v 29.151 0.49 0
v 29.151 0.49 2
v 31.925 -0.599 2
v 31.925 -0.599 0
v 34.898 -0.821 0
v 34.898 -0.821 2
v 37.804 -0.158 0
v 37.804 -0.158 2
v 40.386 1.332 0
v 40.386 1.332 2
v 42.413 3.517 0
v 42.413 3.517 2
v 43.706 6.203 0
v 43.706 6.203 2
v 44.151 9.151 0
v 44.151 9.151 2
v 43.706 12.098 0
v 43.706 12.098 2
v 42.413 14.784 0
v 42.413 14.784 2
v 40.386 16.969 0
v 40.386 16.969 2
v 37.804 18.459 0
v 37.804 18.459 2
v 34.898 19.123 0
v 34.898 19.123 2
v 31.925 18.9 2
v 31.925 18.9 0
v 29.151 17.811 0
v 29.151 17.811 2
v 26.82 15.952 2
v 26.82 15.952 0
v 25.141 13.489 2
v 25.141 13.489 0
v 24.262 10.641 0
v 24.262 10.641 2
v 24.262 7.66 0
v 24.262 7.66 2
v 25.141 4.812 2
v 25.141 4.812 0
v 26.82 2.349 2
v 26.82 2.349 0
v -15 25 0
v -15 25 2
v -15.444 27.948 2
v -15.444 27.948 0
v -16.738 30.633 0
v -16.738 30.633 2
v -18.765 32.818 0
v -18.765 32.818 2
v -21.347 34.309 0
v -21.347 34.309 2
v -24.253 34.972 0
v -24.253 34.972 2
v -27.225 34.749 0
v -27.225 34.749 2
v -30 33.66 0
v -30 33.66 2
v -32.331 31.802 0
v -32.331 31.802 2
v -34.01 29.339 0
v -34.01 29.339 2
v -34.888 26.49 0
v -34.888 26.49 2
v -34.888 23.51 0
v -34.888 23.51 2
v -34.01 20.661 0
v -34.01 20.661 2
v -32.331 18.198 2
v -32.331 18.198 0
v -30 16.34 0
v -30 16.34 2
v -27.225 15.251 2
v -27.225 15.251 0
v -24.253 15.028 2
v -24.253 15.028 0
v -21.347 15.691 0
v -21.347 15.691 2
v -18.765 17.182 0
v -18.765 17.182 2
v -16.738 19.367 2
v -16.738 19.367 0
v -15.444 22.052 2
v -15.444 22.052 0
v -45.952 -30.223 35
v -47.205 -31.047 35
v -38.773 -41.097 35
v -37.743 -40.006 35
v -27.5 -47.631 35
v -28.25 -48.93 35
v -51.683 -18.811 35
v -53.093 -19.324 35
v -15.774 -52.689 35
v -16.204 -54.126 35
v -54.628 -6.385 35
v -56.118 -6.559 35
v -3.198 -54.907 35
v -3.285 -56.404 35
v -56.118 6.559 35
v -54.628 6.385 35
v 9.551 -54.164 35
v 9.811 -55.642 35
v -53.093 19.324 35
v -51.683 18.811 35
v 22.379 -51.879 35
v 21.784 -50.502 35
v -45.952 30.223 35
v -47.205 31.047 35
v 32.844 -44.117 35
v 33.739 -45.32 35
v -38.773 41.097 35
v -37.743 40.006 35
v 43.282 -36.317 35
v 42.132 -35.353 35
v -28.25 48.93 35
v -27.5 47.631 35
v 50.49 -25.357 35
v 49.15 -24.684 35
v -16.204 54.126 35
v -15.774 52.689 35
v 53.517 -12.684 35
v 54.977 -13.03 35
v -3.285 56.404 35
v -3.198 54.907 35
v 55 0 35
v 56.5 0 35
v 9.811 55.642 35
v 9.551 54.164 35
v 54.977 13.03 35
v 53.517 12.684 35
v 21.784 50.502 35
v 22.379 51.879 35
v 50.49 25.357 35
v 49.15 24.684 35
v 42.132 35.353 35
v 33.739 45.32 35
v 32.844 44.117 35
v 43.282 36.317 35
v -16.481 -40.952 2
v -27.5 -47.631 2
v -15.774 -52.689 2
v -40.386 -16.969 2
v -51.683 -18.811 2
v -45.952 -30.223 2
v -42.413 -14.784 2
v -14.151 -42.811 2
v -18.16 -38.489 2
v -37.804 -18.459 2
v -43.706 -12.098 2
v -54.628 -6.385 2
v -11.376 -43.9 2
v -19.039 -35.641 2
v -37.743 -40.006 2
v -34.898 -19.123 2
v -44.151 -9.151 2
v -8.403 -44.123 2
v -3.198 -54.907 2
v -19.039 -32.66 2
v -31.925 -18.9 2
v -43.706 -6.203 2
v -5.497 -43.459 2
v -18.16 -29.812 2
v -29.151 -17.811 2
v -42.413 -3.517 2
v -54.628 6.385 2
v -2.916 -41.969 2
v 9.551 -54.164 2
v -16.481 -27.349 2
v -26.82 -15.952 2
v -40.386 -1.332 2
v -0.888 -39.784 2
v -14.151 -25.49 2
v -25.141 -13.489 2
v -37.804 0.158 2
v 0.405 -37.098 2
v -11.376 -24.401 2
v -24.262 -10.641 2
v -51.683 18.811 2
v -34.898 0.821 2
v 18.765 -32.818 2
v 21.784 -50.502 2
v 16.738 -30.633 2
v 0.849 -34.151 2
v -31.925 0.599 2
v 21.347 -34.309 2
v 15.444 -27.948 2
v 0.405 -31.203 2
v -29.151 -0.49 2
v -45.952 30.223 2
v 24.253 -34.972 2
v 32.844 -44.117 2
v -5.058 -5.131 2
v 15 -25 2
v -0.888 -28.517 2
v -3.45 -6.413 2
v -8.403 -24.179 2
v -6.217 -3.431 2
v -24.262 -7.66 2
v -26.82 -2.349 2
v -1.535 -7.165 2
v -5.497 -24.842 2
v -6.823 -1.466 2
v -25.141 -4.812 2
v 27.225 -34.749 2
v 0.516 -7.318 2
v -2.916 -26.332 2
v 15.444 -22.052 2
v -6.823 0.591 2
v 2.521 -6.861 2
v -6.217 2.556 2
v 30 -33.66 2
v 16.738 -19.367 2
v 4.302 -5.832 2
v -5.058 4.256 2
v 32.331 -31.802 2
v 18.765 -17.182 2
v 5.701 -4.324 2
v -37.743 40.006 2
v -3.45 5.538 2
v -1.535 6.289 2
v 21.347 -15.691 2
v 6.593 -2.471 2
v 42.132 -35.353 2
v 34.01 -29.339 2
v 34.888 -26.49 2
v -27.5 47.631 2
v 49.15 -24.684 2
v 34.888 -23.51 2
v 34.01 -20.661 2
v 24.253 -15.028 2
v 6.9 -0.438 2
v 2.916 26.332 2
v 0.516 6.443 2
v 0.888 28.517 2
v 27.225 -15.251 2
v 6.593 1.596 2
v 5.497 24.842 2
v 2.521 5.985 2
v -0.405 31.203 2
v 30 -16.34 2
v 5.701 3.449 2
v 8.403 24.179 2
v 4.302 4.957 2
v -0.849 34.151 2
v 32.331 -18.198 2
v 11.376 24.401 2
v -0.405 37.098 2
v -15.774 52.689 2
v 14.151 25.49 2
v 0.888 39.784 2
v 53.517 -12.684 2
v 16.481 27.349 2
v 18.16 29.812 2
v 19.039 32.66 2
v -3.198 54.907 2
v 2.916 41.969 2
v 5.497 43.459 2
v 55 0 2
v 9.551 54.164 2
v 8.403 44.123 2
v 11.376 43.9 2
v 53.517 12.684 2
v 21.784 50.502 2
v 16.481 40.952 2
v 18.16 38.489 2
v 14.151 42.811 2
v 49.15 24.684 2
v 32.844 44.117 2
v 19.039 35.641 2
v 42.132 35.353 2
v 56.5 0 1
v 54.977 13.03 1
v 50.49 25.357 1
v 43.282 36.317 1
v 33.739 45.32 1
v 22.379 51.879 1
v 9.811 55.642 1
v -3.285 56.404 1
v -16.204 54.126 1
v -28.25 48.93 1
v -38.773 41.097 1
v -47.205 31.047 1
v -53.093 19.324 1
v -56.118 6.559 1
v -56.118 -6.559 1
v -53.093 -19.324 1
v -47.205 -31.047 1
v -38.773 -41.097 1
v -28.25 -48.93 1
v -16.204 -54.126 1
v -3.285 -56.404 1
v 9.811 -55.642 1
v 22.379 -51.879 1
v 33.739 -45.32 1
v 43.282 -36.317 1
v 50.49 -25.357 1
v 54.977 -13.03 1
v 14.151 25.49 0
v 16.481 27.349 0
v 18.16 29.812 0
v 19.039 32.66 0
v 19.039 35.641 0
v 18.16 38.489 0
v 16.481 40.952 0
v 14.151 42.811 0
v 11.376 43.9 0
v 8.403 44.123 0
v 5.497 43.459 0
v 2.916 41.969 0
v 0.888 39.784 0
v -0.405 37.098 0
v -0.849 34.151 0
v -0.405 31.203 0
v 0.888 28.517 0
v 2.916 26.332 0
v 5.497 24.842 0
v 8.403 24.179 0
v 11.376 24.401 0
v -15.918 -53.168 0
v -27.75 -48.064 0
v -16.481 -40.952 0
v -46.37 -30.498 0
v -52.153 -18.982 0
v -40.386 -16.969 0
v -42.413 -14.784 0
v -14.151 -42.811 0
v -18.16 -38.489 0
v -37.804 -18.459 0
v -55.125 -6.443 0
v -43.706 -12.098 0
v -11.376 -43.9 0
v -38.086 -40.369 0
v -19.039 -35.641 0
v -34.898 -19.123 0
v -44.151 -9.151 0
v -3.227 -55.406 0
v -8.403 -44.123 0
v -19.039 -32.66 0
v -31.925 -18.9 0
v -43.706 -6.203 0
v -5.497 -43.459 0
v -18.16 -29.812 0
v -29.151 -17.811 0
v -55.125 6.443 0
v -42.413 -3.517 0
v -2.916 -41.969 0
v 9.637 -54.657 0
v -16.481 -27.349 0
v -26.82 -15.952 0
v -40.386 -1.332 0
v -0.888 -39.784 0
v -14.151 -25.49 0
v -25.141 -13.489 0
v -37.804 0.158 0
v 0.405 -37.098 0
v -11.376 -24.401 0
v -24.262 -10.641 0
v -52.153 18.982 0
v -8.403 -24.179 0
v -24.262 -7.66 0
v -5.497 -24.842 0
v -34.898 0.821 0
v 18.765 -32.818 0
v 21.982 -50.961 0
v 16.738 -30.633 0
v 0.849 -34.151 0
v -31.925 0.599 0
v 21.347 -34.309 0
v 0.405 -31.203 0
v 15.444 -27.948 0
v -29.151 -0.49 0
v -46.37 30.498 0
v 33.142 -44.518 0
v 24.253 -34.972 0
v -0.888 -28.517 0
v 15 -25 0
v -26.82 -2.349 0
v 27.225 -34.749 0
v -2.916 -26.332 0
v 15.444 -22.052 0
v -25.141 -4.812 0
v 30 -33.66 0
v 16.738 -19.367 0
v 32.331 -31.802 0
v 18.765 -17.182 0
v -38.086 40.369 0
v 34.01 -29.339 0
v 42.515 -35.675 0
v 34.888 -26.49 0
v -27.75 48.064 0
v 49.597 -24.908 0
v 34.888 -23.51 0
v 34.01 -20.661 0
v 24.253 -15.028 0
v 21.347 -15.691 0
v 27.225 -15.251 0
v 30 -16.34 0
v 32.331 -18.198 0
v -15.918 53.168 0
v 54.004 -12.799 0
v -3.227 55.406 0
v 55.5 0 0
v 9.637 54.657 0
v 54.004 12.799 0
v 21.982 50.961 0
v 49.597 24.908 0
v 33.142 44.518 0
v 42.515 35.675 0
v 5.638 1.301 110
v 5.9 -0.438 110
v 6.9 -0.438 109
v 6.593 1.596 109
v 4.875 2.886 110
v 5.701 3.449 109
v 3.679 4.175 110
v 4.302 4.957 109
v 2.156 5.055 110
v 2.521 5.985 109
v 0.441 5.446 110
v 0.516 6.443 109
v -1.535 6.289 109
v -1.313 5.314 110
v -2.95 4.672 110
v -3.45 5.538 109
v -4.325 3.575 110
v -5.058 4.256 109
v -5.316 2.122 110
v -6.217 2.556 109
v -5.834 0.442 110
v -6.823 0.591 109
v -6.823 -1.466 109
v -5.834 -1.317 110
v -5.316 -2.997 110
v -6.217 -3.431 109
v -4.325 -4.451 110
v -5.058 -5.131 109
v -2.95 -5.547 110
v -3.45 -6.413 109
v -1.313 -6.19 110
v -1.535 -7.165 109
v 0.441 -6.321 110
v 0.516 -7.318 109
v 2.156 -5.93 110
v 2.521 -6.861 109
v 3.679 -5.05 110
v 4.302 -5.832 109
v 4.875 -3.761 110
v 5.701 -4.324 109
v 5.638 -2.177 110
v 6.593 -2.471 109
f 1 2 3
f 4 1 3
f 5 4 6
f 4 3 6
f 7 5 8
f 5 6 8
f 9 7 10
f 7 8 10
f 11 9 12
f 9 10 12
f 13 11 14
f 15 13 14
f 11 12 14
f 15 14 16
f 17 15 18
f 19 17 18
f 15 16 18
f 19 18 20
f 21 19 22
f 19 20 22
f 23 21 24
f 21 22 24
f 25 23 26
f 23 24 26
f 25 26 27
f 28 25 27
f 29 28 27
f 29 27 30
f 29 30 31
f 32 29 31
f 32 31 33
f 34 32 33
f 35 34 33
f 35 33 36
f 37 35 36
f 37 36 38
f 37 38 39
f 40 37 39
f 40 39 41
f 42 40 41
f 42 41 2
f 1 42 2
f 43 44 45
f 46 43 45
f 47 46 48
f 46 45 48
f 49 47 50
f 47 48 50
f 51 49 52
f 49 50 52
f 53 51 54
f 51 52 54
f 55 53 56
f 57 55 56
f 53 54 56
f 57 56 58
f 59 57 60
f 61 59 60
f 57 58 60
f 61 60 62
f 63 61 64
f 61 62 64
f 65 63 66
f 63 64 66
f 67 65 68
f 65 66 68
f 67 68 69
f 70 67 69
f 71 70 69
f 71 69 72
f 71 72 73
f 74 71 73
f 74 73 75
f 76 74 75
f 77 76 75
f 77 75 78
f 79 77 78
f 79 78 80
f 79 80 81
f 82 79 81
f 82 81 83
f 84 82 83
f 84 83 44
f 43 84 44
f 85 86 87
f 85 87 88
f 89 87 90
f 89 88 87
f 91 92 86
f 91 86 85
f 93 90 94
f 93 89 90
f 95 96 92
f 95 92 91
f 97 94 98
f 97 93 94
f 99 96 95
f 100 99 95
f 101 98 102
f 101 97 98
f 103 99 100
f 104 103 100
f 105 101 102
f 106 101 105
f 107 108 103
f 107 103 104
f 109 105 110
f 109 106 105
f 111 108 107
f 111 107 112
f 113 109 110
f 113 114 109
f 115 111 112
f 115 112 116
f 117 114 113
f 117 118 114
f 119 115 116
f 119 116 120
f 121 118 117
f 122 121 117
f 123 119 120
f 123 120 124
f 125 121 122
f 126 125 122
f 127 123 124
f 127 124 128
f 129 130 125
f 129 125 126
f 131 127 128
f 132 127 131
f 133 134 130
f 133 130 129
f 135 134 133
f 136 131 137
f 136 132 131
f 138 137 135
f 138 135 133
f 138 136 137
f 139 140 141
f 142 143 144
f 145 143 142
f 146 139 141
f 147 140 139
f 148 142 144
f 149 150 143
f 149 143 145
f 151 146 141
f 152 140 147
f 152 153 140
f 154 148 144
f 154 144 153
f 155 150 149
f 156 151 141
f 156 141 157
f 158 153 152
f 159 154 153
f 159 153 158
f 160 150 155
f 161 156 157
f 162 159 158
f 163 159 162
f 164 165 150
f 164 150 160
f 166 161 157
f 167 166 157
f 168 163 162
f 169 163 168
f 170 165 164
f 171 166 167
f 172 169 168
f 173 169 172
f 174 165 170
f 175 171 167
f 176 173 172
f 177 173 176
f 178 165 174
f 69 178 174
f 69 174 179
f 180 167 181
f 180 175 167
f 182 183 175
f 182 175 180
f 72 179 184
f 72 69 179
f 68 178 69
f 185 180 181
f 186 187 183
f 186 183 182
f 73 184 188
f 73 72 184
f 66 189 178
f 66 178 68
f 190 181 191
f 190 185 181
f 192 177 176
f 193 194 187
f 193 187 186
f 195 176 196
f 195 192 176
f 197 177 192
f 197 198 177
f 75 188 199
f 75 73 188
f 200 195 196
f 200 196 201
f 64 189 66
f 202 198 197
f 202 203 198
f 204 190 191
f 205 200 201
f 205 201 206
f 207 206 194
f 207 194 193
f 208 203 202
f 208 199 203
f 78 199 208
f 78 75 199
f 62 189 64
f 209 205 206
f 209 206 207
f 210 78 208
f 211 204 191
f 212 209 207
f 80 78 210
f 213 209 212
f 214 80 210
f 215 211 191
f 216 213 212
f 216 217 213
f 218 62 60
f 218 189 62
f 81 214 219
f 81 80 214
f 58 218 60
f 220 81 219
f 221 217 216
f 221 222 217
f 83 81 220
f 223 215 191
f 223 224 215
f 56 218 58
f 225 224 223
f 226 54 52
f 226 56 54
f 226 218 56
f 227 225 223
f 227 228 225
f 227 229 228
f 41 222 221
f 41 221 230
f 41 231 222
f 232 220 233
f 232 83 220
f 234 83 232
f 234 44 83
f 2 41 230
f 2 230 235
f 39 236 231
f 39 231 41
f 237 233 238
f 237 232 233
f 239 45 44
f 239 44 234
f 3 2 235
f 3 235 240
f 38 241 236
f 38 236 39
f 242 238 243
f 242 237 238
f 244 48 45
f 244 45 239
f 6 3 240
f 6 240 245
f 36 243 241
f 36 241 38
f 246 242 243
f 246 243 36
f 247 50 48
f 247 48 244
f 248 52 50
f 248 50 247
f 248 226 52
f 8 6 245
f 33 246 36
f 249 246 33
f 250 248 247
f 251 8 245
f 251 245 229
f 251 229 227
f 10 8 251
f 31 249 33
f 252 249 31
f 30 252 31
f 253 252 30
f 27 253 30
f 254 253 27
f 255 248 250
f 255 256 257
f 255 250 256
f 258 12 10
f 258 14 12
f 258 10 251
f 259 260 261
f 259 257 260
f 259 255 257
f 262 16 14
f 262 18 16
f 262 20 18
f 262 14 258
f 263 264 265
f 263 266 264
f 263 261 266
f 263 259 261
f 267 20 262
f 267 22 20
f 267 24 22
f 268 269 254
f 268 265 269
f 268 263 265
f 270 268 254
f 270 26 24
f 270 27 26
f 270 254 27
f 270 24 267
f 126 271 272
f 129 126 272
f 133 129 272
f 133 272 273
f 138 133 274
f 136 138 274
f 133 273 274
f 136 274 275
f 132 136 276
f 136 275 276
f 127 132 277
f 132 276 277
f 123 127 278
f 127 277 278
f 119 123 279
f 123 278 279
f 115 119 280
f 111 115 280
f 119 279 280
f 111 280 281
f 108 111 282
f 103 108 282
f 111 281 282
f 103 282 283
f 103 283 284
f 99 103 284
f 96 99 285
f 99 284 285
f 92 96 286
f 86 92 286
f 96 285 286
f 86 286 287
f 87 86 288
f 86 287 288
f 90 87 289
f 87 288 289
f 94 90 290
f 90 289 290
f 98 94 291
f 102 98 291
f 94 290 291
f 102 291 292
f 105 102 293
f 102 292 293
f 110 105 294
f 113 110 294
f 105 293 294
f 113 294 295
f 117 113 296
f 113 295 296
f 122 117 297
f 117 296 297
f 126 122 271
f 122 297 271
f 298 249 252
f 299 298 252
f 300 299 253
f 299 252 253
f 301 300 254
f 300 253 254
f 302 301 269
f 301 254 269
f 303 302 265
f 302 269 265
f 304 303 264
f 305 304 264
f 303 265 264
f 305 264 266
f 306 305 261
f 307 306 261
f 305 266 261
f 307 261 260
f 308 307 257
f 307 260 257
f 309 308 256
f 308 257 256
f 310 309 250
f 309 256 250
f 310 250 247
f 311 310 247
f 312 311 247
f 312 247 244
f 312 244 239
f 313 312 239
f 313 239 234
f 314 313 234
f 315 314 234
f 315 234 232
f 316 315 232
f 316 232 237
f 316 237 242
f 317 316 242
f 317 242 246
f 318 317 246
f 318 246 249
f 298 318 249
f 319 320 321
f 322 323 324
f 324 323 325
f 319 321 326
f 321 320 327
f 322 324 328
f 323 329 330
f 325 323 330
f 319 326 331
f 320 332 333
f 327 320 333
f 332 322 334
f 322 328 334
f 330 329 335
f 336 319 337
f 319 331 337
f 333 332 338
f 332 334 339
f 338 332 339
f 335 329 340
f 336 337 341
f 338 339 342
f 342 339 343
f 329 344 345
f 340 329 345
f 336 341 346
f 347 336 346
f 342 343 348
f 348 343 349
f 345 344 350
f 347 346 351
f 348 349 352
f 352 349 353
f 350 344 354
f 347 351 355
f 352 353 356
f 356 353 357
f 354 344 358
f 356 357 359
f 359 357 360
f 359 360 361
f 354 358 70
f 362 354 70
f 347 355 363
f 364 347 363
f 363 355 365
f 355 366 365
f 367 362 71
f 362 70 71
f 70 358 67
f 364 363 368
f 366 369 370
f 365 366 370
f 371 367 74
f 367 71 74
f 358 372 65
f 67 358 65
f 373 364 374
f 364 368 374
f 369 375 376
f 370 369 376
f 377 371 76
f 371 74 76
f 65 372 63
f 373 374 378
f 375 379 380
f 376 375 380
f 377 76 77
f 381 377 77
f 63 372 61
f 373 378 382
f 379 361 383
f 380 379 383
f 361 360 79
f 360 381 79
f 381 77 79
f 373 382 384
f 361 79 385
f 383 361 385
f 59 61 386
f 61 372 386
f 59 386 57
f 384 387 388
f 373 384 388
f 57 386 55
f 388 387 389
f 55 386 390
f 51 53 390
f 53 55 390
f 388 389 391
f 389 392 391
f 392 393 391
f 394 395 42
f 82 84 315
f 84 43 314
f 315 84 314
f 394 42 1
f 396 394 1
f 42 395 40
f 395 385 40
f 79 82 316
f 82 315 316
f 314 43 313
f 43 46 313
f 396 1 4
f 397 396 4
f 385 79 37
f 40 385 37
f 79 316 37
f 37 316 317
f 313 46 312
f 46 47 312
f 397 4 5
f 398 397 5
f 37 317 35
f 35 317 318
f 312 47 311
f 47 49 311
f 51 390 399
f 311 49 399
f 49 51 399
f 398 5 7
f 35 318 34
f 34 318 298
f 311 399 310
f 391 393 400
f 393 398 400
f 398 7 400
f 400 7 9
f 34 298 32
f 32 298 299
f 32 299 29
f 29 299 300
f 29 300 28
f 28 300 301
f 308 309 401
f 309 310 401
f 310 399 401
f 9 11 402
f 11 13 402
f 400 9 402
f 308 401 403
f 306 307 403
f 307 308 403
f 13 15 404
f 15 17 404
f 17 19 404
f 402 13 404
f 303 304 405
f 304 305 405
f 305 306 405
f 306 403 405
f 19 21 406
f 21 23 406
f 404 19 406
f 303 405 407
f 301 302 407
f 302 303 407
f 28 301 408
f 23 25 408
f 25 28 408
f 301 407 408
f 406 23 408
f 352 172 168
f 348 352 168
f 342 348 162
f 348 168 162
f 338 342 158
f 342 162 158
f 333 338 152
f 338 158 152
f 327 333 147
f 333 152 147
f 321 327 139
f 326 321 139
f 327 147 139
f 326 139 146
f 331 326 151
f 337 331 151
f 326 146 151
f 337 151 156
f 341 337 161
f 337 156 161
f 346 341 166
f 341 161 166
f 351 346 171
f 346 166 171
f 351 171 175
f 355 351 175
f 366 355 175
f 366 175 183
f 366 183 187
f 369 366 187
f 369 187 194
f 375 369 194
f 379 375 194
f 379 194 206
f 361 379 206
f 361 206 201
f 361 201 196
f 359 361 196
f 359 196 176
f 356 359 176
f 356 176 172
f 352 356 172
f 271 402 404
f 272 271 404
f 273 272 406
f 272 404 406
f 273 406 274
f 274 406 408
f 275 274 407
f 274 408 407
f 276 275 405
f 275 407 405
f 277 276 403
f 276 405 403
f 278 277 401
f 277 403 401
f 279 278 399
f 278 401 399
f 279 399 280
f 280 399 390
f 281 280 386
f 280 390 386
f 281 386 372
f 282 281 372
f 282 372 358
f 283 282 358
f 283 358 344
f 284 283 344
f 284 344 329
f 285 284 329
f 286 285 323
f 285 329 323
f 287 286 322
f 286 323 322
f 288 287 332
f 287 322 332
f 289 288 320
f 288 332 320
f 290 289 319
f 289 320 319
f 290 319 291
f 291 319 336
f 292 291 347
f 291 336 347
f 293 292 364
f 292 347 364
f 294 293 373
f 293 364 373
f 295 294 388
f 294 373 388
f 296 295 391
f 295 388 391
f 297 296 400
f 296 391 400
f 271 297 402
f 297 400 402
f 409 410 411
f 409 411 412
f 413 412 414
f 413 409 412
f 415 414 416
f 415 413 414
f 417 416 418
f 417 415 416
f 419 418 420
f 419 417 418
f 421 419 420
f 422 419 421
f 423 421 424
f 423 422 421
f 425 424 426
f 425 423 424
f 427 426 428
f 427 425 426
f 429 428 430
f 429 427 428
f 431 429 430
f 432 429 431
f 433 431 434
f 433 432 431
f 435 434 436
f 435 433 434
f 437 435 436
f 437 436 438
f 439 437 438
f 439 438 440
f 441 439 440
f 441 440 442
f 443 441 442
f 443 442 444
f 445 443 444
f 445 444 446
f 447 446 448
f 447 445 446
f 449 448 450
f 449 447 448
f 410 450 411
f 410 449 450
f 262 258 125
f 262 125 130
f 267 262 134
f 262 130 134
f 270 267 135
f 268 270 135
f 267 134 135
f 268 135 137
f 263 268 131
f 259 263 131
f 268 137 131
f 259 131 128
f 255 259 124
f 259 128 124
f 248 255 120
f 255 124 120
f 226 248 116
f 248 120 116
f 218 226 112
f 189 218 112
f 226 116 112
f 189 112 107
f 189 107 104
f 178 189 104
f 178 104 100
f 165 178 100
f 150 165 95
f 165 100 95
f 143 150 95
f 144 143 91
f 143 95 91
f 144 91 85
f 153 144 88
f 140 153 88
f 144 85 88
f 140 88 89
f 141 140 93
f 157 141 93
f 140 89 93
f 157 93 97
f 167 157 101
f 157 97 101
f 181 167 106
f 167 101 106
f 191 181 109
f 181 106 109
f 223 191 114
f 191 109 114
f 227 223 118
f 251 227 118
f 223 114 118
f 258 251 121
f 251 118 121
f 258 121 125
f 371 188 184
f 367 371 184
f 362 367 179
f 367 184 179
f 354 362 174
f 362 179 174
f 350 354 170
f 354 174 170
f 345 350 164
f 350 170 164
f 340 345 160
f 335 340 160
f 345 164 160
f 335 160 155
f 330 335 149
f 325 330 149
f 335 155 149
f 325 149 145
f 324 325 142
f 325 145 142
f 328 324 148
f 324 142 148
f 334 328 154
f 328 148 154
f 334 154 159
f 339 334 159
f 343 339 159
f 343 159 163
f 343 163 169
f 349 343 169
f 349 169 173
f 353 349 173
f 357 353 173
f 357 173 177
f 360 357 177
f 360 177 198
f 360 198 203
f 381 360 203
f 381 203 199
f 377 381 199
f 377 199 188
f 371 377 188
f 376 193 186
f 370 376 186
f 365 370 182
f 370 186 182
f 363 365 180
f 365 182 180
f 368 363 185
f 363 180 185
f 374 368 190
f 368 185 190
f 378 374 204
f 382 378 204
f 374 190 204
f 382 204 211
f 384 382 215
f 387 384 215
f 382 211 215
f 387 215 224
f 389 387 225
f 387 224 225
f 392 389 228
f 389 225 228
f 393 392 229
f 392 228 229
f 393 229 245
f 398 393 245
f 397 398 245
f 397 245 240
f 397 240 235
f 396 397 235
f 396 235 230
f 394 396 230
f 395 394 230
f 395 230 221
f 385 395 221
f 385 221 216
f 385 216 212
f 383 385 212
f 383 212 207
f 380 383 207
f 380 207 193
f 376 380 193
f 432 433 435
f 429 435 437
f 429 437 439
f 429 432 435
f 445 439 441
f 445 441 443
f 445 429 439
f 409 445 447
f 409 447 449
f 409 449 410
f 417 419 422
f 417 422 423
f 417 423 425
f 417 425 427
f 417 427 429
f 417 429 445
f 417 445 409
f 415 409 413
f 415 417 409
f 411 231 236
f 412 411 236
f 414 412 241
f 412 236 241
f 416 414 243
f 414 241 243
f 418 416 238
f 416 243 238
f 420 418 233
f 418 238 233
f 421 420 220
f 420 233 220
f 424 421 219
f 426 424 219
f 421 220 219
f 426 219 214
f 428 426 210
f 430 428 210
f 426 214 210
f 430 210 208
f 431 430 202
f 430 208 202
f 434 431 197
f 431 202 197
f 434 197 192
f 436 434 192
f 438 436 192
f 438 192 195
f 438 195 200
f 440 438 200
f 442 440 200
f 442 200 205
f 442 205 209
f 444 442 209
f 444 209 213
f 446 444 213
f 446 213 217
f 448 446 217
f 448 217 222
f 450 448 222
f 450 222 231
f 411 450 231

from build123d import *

# Parameters (mm, degrees)
SKETCH_R           = 56.5
PAD_DEPTH          = 35
SKETCH001_R        = 55
POCKET_DEPTH       = 33
SKETCH002_R        = 6.9
PAD001_DEPTH       = 110
CHAMFER_SIZE       = 1
CHAMFER001_SIZE    = 1
SKETCH006_R        = 10
POCKET002_DEPTH    = 5
POLARPATTERN_COUNT = 6


with BuildPart() as part:
    # Sketch → Pad (new body)
    with BuildSketch(Plane.XY):
        Circle(SKETCH_R)
    extrude(amount=PAD_DEPTH)

    # Sketch001 (on Face3 of Pad) → Pocket (cut)
    with BuildSketch(Plane.XY.offset(35)):
        Circle(SKETCH001_R)
    extrude(amount=-POCKET_DEPTH, mode=Mode.SUBTRACT)

    # Sketch002 → Pad001 (join)
    with BuildSketch(Plane.XY):
        with Locations((0, -0.437585)):
            Circle(SKETCH002_R)
    extrude(amount=PAD001_DEPTH)

    # Chamfer
    chamfer_edges = [part.edges().sort_by_distance(p)[0] for p in [
        (-6.9, -0.437585, 110),
    ]]
    chamfer(chamfer_edges, length=CHAMFER_SIZE)

    # Chamfer001
    chamfer001_edges = [part.edges().sort_by_distance(p)[0] for p in [
        (-56.5, 0, 0),
    ]]
    chamfer(chamfer001_edges, length=CHAMFER001_SIZE)

    # Sketch006 (on Face6 of Pad001) → Pocket002 (cut)
    with BuildSketch(Plane.XY.offset(2)):
        with Locations((-25, 25)):
            Circle(SKETCH006_R)
    pocket002 = extrude(amount=-POCKET002_DEPTH, mode=Mode.SUBTRACT)

    # PolarPattern: Pocket002 ×6 about axis
    polarpattern_axis = Axis((0, 0, 2), (0, 0, 1))
    for i in range(1, POLARPATTERN_COUNT):
        add(pocket002.rotate(polarpattern_axis, i * 360 / POLARPATTERN_COUNT), mode=Mode.SUBTRACT)


solid = part.part
